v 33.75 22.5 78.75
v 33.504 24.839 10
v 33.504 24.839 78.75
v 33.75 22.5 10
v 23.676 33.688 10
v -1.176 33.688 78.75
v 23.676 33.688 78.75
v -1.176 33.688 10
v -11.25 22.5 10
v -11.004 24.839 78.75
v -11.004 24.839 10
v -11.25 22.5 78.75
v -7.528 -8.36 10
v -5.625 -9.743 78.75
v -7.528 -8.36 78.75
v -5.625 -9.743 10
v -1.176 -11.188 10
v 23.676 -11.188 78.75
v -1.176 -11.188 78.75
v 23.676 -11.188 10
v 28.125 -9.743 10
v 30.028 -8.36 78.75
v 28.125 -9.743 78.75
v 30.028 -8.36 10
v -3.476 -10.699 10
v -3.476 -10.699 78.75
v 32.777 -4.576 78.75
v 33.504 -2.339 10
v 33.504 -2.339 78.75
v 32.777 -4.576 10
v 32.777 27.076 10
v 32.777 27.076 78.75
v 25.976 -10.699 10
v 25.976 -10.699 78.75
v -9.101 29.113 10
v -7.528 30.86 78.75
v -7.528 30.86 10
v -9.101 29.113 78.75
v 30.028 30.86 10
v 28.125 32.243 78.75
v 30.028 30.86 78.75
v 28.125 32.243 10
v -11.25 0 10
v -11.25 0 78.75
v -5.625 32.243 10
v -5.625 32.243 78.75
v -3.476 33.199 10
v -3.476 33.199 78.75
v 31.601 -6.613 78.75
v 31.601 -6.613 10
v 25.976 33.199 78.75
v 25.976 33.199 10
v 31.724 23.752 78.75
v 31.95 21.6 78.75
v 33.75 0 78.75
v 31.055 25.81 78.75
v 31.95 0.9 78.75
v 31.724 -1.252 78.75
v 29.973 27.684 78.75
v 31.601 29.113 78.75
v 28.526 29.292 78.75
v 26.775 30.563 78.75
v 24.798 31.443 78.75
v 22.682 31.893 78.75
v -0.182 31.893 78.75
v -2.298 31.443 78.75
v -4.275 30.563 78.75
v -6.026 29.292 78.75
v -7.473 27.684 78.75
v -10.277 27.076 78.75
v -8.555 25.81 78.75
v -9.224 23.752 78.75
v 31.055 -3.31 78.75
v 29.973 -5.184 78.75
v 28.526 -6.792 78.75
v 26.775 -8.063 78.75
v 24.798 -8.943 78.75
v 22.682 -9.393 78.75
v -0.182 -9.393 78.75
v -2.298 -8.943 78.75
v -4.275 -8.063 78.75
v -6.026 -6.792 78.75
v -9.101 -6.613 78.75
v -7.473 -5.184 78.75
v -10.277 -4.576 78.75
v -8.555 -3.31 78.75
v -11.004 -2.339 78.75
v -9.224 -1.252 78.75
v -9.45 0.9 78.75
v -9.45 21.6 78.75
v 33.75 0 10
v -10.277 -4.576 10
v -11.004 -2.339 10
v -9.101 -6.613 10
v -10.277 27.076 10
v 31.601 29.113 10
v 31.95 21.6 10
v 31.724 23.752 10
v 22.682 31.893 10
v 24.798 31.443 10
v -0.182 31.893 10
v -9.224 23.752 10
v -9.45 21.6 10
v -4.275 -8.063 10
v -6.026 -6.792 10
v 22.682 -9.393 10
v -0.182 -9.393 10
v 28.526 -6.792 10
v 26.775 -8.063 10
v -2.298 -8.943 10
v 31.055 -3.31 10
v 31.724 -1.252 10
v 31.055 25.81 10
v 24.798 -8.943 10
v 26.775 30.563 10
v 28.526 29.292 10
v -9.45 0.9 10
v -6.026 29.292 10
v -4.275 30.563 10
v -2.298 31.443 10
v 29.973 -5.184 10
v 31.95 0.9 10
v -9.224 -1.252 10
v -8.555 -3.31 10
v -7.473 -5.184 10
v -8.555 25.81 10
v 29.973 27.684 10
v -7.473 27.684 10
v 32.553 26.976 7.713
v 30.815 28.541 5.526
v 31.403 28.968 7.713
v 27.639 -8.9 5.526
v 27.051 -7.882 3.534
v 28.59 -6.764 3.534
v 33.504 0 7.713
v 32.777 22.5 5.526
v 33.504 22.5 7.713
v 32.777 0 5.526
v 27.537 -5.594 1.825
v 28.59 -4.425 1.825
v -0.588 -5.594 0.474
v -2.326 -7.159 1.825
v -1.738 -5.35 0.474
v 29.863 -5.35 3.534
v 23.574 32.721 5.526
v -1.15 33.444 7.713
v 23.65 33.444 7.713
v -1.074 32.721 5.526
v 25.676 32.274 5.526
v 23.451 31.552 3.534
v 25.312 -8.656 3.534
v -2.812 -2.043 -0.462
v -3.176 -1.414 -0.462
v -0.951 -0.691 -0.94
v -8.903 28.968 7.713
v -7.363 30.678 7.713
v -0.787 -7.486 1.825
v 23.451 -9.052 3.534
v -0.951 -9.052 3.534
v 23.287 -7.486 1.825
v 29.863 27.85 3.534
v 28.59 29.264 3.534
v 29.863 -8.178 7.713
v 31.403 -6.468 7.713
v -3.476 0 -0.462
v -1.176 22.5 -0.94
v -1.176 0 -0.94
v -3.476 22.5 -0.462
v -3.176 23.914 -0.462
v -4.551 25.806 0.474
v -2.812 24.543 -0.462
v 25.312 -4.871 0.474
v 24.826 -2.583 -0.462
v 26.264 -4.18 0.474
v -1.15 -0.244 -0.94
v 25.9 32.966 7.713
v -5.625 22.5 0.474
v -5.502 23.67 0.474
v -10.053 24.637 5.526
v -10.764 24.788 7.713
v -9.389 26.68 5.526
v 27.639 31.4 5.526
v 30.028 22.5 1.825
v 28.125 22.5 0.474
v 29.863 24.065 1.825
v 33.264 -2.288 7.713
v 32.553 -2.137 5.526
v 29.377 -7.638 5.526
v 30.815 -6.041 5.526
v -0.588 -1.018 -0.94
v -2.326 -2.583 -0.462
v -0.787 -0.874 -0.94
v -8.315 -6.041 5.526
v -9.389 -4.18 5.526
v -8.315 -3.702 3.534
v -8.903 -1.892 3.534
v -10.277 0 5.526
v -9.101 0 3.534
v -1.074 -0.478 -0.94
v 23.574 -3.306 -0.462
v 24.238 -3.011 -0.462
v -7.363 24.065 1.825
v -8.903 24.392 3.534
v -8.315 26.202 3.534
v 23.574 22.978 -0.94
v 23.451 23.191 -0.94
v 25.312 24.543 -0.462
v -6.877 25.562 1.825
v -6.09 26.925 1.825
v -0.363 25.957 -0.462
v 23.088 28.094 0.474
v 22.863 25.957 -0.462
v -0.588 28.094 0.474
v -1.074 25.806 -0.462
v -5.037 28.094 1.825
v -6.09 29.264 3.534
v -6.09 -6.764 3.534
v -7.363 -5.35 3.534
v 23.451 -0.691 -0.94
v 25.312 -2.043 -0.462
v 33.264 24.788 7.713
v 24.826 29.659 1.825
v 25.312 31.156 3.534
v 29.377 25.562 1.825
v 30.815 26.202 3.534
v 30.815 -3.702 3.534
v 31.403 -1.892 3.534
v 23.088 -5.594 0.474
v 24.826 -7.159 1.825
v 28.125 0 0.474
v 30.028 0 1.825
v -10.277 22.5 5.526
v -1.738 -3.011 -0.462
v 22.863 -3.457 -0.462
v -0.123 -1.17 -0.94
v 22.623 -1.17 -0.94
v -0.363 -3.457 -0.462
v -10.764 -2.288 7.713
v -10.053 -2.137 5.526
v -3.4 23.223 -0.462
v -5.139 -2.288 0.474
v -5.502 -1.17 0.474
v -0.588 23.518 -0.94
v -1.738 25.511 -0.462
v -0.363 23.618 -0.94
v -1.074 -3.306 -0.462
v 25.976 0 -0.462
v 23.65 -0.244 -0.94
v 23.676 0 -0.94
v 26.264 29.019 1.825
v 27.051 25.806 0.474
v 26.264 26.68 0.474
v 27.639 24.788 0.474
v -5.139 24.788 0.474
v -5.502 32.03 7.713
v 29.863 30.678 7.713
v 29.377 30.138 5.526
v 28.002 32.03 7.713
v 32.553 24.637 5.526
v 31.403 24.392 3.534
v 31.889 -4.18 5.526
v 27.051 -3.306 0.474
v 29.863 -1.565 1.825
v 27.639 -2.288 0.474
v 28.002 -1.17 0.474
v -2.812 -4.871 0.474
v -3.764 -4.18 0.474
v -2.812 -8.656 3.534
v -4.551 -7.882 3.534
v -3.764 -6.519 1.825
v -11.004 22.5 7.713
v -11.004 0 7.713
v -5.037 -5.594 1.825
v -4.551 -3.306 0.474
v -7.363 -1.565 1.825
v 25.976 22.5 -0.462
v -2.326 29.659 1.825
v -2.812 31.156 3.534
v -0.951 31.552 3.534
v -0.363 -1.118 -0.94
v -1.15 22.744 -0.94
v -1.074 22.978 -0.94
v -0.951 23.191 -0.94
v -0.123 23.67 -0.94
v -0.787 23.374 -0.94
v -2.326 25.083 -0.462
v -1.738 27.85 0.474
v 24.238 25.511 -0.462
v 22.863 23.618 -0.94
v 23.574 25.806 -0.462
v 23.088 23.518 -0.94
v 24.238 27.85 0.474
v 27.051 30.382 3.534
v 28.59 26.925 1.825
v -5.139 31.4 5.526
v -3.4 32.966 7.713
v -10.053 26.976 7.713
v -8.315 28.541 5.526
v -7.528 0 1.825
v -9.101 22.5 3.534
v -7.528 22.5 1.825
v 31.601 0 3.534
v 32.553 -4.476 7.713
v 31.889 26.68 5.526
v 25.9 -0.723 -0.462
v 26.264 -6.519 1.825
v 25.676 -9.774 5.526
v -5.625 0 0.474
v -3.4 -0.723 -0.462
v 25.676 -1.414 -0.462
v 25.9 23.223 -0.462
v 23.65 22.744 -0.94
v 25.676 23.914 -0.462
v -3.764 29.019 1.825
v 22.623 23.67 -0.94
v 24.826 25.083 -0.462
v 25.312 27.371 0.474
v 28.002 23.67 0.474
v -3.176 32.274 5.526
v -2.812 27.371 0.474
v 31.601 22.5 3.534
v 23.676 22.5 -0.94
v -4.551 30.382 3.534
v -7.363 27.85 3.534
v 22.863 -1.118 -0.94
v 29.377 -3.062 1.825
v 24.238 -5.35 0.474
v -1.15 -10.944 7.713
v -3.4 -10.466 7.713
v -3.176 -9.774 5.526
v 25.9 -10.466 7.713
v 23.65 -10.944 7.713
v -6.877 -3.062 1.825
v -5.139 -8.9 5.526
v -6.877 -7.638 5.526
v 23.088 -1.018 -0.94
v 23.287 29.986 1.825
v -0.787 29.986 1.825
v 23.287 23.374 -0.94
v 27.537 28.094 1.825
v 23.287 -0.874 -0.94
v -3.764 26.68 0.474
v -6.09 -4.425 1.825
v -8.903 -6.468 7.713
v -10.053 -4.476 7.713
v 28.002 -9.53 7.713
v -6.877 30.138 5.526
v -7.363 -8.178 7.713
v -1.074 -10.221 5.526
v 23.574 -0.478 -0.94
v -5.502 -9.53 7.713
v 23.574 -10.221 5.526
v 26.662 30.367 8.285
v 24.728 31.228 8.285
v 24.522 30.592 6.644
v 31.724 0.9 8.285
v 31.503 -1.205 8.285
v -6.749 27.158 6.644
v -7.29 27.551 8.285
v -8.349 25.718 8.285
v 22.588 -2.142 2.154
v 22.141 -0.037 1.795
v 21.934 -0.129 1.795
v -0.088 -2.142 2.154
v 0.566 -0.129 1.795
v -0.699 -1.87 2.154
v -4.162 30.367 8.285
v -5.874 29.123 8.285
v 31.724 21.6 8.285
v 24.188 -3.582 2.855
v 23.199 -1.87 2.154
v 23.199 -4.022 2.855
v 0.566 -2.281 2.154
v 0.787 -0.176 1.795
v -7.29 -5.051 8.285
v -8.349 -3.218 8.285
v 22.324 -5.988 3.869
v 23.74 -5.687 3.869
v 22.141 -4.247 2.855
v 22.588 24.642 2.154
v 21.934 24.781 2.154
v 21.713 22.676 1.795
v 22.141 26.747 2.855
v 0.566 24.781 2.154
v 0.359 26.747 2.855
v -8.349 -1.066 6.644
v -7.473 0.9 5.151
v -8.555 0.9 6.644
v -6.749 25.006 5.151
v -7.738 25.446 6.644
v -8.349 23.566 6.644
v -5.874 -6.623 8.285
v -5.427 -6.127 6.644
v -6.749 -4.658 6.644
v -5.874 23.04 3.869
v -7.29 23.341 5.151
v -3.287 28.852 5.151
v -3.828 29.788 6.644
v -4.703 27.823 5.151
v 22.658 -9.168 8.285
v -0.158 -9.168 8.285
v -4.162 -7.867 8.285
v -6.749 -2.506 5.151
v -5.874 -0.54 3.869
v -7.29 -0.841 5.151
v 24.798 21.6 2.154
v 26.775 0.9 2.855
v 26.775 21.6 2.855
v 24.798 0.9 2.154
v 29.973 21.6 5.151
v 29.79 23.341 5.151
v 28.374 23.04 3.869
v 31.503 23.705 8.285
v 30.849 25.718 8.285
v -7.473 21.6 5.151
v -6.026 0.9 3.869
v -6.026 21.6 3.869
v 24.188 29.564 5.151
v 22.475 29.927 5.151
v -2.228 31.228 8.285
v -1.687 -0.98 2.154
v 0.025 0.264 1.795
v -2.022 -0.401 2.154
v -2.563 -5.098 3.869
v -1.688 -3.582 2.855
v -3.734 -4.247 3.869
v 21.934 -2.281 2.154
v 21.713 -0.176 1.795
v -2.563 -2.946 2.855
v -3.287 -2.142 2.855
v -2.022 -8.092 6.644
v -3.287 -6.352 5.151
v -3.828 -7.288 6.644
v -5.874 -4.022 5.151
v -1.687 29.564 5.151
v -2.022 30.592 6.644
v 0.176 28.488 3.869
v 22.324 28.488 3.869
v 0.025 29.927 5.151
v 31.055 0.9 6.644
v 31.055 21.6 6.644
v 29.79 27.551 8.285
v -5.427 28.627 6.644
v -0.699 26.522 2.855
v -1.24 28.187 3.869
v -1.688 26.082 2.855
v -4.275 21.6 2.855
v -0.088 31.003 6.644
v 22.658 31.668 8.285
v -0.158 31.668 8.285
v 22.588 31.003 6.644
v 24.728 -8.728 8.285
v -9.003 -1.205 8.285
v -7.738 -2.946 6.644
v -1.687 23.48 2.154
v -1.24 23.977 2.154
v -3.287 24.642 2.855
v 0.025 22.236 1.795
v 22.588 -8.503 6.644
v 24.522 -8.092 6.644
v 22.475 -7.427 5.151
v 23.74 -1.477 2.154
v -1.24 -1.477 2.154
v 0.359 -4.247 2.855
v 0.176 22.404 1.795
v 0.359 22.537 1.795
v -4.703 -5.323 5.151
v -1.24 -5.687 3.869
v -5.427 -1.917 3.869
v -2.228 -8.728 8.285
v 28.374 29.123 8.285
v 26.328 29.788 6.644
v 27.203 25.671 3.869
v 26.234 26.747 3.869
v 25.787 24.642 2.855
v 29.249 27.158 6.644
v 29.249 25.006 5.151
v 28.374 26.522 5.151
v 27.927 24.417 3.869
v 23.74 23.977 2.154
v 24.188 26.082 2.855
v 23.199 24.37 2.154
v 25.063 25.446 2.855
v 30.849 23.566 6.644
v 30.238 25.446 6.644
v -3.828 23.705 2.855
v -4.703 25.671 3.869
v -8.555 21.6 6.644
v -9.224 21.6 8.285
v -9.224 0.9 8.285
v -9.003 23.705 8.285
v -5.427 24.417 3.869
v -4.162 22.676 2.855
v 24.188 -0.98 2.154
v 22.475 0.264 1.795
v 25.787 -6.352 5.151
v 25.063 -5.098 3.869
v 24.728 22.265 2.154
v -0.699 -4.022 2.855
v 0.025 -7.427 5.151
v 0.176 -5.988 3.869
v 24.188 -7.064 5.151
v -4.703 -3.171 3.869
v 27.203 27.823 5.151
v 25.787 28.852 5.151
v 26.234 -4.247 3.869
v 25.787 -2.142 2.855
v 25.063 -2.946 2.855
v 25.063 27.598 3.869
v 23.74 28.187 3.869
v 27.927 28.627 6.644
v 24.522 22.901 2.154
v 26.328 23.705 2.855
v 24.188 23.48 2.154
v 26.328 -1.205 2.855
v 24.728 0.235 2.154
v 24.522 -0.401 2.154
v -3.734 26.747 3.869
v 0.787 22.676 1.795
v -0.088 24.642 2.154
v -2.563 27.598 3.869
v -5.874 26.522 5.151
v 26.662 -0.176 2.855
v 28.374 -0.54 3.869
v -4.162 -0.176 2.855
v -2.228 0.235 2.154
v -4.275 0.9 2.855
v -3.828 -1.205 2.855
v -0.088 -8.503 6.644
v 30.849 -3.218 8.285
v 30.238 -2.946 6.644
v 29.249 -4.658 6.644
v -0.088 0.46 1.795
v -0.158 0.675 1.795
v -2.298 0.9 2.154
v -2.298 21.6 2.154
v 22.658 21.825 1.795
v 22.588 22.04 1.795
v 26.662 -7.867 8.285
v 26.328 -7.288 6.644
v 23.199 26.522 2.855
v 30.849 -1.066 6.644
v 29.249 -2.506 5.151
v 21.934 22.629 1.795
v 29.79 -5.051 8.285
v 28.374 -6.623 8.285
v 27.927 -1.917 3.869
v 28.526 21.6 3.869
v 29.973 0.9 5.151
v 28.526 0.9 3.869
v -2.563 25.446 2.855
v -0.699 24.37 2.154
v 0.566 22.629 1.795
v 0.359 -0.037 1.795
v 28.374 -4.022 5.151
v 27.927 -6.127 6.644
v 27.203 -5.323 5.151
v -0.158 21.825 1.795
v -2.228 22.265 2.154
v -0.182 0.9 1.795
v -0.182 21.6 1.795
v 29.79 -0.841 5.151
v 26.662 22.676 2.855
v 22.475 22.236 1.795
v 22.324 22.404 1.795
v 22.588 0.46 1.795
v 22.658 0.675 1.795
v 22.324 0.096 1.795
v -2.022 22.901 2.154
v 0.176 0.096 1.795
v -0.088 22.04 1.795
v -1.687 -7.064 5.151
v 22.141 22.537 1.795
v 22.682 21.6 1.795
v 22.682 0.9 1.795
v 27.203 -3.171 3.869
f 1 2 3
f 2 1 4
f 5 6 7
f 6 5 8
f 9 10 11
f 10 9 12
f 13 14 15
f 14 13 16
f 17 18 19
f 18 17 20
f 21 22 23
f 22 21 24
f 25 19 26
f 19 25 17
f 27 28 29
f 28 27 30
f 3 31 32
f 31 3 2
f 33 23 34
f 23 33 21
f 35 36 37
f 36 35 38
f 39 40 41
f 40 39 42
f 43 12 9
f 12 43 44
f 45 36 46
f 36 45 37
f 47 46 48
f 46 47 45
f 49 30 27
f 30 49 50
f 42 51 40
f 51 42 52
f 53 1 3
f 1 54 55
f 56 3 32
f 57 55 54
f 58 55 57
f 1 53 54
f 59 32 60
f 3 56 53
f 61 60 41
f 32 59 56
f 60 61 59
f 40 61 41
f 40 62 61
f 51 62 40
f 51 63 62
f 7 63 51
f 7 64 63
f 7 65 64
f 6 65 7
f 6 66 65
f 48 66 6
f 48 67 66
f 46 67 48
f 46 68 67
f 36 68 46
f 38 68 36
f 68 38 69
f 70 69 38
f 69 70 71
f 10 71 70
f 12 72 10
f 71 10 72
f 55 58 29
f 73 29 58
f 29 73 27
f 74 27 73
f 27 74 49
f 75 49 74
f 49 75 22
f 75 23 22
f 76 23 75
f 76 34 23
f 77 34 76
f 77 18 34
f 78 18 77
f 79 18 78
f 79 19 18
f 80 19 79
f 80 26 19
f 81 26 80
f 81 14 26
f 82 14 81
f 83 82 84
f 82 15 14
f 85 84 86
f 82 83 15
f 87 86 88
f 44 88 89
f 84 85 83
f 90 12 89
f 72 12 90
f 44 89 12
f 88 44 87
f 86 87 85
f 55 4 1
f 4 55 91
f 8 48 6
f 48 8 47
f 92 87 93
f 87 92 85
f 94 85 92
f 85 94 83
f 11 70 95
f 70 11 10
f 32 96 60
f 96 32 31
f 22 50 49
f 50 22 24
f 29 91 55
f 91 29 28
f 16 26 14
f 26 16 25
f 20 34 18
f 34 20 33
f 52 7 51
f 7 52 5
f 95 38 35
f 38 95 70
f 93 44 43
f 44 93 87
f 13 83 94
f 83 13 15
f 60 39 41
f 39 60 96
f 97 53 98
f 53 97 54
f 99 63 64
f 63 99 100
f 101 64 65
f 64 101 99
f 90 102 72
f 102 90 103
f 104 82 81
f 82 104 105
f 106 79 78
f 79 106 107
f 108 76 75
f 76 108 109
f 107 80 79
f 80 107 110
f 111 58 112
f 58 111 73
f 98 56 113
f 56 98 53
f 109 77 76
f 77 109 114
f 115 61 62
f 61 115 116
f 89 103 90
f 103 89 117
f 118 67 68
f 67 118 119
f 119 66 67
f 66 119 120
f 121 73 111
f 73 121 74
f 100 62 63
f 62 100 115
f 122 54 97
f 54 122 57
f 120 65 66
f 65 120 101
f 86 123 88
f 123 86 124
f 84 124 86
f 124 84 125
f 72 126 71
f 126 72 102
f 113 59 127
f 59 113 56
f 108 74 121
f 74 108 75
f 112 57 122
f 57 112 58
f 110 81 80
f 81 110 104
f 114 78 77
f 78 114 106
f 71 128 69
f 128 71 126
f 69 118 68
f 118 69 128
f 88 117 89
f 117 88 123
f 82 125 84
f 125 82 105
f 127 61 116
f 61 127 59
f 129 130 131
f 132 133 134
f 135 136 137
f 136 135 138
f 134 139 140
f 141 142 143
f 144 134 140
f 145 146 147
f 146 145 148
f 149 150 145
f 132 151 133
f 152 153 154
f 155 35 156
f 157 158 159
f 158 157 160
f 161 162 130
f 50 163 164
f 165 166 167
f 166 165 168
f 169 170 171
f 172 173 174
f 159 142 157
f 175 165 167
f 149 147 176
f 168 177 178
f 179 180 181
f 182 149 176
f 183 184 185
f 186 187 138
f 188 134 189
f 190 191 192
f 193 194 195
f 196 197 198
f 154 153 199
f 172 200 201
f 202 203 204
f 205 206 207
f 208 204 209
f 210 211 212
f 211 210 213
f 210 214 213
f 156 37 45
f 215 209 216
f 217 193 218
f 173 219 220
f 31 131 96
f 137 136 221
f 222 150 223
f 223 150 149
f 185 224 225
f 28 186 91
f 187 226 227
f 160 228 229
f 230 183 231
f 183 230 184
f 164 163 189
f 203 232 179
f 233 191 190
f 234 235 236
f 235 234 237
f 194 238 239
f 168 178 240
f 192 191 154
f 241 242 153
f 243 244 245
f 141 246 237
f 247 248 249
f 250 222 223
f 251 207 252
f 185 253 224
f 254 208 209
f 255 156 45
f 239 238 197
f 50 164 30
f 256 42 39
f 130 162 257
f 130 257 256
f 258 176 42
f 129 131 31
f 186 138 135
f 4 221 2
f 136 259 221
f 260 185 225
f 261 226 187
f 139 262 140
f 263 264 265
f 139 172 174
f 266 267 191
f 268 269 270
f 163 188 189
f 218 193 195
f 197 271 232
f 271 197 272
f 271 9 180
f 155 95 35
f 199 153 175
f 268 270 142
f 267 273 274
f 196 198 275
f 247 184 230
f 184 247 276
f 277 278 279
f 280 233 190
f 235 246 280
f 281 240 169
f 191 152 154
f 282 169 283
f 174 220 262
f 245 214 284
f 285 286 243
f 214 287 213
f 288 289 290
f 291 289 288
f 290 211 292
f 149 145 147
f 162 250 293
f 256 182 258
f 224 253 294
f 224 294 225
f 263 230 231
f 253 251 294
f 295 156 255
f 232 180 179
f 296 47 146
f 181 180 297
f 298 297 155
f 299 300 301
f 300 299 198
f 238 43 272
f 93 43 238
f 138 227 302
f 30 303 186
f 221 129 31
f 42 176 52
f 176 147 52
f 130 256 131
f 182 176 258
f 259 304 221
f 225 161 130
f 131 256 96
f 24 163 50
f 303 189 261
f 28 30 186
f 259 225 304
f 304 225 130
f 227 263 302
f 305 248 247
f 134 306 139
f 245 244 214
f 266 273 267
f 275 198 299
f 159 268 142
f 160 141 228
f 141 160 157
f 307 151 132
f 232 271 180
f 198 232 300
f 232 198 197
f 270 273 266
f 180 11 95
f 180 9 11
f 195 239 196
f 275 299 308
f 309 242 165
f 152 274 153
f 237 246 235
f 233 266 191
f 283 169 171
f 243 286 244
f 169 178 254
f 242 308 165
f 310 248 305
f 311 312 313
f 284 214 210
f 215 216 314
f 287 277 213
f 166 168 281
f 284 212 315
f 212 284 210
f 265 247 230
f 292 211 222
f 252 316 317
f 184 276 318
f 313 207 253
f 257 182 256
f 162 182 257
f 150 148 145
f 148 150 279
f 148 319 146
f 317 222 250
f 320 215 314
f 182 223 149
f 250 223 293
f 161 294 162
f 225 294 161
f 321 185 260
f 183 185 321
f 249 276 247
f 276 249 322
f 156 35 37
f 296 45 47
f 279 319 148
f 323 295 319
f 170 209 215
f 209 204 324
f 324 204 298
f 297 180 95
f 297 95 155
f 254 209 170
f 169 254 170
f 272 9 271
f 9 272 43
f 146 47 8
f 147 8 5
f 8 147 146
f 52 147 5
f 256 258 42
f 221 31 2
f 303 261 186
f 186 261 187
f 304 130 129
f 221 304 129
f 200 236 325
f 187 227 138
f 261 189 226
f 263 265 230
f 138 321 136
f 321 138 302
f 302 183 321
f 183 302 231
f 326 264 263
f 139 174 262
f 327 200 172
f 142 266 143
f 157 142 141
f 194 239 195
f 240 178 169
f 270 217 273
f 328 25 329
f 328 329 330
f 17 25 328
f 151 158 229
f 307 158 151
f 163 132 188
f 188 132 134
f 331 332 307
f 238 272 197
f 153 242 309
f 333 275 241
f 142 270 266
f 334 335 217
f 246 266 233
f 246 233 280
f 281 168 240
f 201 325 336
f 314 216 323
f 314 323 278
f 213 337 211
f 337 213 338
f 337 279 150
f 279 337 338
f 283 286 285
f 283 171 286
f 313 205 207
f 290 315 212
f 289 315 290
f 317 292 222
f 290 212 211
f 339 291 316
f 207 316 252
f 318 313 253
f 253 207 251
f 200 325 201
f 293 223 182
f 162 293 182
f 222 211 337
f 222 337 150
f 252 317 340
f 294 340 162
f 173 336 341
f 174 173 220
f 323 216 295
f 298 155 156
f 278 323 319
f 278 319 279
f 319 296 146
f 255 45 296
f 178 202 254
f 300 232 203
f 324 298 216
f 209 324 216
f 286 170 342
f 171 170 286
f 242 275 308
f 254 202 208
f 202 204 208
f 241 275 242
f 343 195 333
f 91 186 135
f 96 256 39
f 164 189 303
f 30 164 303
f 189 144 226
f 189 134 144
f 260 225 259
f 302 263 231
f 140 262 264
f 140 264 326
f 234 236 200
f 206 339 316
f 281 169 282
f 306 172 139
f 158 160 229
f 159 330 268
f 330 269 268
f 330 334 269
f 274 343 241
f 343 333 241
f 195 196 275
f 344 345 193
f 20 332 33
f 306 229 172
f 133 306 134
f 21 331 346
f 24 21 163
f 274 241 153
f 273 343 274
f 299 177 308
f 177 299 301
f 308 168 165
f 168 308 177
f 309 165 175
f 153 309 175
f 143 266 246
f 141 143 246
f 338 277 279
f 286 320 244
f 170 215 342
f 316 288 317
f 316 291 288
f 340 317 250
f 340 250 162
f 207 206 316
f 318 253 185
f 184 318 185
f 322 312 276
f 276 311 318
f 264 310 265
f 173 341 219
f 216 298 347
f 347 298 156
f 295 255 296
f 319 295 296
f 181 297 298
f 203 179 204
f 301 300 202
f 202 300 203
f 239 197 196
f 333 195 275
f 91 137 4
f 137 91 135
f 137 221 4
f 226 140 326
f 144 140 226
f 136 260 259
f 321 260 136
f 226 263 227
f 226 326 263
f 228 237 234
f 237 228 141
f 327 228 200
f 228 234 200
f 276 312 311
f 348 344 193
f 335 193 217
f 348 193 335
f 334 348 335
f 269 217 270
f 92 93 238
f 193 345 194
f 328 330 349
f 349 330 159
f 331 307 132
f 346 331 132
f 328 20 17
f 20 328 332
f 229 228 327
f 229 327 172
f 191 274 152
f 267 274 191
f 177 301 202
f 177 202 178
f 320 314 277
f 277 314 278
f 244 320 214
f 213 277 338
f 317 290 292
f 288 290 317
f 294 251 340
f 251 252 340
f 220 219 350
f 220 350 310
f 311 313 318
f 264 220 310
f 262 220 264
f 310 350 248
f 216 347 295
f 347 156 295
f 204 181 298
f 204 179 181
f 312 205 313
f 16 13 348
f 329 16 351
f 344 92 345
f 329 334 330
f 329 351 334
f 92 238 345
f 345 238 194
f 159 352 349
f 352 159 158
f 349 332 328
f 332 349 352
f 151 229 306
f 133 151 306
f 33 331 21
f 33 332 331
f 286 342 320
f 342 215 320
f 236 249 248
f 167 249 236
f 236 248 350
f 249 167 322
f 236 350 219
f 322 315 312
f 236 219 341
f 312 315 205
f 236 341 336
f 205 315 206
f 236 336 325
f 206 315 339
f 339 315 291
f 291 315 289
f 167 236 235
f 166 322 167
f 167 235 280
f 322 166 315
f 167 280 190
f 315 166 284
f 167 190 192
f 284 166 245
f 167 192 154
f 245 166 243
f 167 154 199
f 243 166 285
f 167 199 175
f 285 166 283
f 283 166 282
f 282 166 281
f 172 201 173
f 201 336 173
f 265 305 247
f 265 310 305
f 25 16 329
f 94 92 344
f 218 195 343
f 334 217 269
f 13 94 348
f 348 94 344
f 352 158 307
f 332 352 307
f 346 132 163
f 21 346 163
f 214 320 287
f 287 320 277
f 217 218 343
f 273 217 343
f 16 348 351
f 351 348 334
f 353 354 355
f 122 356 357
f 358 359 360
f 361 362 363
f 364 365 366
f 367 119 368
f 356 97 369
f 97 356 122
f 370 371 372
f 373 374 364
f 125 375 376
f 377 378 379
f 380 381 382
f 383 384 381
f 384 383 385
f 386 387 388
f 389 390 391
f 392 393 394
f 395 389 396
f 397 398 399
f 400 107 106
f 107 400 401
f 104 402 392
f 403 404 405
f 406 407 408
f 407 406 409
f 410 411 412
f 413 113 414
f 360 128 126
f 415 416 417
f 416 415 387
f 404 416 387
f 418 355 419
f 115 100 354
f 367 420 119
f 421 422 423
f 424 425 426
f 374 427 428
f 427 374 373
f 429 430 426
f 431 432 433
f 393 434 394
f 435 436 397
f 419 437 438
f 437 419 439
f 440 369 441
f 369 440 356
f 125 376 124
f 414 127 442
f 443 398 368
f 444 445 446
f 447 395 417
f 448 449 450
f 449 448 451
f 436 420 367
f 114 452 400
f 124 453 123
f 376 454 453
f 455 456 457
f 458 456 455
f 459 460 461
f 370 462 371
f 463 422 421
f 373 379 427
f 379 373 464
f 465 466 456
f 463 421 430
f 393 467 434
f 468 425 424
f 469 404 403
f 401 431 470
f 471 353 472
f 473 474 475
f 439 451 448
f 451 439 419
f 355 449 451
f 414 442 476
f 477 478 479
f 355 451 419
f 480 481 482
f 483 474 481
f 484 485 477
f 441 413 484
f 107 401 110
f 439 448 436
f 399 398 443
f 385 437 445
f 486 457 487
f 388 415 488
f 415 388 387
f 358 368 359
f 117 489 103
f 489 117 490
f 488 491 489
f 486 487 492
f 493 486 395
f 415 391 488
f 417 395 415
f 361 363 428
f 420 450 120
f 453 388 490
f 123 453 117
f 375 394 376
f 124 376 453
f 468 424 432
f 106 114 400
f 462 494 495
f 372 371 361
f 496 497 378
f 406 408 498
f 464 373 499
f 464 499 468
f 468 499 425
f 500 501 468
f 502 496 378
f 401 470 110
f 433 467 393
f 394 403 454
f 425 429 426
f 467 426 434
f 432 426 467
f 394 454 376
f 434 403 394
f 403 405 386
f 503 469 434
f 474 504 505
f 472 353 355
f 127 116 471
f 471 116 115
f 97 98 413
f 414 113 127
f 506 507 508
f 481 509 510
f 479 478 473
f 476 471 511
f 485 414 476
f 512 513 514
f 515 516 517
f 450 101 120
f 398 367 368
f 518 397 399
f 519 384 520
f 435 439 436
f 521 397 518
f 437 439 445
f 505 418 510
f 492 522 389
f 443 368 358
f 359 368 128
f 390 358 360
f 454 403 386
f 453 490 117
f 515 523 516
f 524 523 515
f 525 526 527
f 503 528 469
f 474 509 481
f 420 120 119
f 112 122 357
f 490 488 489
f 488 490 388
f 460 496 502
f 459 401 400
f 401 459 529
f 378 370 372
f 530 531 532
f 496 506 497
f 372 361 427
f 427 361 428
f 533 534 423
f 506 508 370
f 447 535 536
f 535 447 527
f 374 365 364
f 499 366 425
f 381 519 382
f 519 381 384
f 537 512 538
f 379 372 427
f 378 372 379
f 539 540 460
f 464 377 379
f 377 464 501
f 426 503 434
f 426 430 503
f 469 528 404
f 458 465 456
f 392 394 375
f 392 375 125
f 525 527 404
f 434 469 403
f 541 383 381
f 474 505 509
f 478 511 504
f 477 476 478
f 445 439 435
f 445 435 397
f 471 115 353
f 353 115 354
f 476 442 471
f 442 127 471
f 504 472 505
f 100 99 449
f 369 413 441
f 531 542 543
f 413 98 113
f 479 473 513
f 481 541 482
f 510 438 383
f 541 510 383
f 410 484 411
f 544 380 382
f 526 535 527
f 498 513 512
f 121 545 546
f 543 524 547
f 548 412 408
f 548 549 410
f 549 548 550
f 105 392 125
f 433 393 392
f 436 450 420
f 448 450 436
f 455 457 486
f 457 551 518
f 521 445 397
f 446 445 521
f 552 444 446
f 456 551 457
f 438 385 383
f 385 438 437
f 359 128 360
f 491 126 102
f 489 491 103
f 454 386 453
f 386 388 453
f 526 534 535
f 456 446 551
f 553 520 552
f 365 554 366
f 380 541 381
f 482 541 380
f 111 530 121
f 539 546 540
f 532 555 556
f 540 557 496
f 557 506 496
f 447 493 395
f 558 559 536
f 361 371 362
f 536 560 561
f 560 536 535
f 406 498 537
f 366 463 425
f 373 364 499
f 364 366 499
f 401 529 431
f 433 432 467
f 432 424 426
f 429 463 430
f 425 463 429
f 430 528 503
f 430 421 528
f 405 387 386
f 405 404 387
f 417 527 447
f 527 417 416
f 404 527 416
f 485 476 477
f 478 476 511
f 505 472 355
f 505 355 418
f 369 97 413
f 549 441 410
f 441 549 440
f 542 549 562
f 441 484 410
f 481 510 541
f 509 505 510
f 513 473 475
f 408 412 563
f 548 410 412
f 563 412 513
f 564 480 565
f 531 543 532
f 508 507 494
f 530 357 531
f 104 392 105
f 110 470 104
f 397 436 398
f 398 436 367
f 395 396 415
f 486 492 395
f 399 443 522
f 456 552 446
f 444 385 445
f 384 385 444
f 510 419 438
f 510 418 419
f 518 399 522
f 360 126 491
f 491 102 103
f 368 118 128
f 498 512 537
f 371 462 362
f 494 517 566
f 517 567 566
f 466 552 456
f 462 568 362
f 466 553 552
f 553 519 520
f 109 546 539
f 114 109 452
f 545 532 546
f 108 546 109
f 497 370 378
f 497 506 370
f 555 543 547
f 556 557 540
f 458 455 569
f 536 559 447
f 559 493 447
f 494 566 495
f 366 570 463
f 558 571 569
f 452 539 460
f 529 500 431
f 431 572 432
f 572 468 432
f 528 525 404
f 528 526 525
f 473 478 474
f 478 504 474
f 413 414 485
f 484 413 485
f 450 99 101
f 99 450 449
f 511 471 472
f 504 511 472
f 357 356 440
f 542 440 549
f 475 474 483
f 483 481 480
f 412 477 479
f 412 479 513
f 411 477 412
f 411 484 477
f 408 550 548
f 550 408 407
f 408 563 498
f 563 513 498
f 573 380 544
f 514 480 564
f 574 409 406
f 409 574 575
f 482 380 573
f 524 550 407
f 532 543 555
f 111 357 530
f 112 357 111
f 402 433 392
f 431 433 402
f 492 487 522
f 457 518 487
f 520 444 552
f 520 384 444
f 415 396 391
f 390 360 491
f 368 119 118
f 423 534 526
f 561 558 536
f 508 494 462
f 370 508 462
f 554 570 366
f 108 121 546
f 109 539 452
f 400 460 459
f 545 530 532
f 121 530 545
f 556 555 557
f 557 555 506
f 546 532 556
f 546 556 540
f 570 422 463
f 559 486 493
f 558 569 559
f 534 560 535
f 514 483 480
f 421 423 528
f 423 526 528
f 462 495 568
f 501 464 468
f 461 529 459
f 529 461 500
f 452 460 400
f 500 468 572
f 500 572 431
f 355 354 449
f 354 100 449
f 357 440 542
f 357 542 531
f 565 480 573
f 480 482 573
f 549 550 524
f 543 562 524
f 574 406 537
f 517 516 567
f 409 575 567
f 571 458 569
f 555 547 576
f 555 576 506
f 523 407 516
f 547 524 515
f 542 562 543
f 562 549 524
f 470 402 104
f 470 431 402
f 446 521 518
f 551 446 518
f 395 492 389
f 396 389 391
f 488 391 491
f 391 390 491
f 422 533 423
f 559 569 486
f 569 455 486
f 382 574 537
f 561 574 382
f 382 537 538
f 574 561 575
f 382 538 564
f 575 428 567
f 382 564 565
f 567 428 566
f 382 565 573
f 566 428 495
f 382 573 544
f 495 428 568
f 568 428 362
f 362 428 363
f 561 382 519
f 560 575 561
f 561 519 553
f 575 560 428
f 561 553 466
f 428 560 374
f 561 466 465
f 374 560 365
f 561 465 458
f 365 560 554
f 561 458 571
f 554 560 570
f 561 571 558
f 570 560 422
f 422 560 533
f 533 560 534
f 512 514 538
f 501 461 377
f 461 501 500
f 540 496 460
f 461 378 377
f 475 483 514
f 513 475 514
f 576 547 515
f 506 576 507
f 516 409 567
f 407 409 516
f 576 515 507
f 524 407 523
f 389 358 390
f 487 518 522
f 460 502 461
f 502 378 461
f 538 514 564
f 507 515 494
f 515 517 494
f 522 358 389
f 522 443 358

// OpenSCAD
module cup() {
    height = 125;
    radius = 25;
    
    module rounded_cube() {
        points = [ [0,0,0], [50,0,0], [0,50,0], [50,50,0] ];
        
        hull() {
            for (p = points){
                translate(p) cylinder(r=radius, h=height);
            }
        }
    }
    module base() {
        scale([1, 1, .06])rounded_cube();
    }
    module rounded_base() {
        points = [ [0,0,0], [50,0,0], [0,50,0], [50,50,0] ];

        hull() {
            for (p = points){
                translate(p) sphere(r=25);
            }
        }
    }
   

    difference() {
        rounded_cube();
        translate([2, 2, 0])scale([.92, .92, 1.1]) rounded_cube();
    }
    difference() {
        scale([1, 1,.8])rounded_base();
        translate([2, 2, 0])scale([1, 1, 1.1]) rounded_cube();
        translate([2, 2, 0])scale([.92, .92,.6])rounded_base();
    }
     
}

translate([0, 0, 10])scale([.45, .45, .55]) cup();
